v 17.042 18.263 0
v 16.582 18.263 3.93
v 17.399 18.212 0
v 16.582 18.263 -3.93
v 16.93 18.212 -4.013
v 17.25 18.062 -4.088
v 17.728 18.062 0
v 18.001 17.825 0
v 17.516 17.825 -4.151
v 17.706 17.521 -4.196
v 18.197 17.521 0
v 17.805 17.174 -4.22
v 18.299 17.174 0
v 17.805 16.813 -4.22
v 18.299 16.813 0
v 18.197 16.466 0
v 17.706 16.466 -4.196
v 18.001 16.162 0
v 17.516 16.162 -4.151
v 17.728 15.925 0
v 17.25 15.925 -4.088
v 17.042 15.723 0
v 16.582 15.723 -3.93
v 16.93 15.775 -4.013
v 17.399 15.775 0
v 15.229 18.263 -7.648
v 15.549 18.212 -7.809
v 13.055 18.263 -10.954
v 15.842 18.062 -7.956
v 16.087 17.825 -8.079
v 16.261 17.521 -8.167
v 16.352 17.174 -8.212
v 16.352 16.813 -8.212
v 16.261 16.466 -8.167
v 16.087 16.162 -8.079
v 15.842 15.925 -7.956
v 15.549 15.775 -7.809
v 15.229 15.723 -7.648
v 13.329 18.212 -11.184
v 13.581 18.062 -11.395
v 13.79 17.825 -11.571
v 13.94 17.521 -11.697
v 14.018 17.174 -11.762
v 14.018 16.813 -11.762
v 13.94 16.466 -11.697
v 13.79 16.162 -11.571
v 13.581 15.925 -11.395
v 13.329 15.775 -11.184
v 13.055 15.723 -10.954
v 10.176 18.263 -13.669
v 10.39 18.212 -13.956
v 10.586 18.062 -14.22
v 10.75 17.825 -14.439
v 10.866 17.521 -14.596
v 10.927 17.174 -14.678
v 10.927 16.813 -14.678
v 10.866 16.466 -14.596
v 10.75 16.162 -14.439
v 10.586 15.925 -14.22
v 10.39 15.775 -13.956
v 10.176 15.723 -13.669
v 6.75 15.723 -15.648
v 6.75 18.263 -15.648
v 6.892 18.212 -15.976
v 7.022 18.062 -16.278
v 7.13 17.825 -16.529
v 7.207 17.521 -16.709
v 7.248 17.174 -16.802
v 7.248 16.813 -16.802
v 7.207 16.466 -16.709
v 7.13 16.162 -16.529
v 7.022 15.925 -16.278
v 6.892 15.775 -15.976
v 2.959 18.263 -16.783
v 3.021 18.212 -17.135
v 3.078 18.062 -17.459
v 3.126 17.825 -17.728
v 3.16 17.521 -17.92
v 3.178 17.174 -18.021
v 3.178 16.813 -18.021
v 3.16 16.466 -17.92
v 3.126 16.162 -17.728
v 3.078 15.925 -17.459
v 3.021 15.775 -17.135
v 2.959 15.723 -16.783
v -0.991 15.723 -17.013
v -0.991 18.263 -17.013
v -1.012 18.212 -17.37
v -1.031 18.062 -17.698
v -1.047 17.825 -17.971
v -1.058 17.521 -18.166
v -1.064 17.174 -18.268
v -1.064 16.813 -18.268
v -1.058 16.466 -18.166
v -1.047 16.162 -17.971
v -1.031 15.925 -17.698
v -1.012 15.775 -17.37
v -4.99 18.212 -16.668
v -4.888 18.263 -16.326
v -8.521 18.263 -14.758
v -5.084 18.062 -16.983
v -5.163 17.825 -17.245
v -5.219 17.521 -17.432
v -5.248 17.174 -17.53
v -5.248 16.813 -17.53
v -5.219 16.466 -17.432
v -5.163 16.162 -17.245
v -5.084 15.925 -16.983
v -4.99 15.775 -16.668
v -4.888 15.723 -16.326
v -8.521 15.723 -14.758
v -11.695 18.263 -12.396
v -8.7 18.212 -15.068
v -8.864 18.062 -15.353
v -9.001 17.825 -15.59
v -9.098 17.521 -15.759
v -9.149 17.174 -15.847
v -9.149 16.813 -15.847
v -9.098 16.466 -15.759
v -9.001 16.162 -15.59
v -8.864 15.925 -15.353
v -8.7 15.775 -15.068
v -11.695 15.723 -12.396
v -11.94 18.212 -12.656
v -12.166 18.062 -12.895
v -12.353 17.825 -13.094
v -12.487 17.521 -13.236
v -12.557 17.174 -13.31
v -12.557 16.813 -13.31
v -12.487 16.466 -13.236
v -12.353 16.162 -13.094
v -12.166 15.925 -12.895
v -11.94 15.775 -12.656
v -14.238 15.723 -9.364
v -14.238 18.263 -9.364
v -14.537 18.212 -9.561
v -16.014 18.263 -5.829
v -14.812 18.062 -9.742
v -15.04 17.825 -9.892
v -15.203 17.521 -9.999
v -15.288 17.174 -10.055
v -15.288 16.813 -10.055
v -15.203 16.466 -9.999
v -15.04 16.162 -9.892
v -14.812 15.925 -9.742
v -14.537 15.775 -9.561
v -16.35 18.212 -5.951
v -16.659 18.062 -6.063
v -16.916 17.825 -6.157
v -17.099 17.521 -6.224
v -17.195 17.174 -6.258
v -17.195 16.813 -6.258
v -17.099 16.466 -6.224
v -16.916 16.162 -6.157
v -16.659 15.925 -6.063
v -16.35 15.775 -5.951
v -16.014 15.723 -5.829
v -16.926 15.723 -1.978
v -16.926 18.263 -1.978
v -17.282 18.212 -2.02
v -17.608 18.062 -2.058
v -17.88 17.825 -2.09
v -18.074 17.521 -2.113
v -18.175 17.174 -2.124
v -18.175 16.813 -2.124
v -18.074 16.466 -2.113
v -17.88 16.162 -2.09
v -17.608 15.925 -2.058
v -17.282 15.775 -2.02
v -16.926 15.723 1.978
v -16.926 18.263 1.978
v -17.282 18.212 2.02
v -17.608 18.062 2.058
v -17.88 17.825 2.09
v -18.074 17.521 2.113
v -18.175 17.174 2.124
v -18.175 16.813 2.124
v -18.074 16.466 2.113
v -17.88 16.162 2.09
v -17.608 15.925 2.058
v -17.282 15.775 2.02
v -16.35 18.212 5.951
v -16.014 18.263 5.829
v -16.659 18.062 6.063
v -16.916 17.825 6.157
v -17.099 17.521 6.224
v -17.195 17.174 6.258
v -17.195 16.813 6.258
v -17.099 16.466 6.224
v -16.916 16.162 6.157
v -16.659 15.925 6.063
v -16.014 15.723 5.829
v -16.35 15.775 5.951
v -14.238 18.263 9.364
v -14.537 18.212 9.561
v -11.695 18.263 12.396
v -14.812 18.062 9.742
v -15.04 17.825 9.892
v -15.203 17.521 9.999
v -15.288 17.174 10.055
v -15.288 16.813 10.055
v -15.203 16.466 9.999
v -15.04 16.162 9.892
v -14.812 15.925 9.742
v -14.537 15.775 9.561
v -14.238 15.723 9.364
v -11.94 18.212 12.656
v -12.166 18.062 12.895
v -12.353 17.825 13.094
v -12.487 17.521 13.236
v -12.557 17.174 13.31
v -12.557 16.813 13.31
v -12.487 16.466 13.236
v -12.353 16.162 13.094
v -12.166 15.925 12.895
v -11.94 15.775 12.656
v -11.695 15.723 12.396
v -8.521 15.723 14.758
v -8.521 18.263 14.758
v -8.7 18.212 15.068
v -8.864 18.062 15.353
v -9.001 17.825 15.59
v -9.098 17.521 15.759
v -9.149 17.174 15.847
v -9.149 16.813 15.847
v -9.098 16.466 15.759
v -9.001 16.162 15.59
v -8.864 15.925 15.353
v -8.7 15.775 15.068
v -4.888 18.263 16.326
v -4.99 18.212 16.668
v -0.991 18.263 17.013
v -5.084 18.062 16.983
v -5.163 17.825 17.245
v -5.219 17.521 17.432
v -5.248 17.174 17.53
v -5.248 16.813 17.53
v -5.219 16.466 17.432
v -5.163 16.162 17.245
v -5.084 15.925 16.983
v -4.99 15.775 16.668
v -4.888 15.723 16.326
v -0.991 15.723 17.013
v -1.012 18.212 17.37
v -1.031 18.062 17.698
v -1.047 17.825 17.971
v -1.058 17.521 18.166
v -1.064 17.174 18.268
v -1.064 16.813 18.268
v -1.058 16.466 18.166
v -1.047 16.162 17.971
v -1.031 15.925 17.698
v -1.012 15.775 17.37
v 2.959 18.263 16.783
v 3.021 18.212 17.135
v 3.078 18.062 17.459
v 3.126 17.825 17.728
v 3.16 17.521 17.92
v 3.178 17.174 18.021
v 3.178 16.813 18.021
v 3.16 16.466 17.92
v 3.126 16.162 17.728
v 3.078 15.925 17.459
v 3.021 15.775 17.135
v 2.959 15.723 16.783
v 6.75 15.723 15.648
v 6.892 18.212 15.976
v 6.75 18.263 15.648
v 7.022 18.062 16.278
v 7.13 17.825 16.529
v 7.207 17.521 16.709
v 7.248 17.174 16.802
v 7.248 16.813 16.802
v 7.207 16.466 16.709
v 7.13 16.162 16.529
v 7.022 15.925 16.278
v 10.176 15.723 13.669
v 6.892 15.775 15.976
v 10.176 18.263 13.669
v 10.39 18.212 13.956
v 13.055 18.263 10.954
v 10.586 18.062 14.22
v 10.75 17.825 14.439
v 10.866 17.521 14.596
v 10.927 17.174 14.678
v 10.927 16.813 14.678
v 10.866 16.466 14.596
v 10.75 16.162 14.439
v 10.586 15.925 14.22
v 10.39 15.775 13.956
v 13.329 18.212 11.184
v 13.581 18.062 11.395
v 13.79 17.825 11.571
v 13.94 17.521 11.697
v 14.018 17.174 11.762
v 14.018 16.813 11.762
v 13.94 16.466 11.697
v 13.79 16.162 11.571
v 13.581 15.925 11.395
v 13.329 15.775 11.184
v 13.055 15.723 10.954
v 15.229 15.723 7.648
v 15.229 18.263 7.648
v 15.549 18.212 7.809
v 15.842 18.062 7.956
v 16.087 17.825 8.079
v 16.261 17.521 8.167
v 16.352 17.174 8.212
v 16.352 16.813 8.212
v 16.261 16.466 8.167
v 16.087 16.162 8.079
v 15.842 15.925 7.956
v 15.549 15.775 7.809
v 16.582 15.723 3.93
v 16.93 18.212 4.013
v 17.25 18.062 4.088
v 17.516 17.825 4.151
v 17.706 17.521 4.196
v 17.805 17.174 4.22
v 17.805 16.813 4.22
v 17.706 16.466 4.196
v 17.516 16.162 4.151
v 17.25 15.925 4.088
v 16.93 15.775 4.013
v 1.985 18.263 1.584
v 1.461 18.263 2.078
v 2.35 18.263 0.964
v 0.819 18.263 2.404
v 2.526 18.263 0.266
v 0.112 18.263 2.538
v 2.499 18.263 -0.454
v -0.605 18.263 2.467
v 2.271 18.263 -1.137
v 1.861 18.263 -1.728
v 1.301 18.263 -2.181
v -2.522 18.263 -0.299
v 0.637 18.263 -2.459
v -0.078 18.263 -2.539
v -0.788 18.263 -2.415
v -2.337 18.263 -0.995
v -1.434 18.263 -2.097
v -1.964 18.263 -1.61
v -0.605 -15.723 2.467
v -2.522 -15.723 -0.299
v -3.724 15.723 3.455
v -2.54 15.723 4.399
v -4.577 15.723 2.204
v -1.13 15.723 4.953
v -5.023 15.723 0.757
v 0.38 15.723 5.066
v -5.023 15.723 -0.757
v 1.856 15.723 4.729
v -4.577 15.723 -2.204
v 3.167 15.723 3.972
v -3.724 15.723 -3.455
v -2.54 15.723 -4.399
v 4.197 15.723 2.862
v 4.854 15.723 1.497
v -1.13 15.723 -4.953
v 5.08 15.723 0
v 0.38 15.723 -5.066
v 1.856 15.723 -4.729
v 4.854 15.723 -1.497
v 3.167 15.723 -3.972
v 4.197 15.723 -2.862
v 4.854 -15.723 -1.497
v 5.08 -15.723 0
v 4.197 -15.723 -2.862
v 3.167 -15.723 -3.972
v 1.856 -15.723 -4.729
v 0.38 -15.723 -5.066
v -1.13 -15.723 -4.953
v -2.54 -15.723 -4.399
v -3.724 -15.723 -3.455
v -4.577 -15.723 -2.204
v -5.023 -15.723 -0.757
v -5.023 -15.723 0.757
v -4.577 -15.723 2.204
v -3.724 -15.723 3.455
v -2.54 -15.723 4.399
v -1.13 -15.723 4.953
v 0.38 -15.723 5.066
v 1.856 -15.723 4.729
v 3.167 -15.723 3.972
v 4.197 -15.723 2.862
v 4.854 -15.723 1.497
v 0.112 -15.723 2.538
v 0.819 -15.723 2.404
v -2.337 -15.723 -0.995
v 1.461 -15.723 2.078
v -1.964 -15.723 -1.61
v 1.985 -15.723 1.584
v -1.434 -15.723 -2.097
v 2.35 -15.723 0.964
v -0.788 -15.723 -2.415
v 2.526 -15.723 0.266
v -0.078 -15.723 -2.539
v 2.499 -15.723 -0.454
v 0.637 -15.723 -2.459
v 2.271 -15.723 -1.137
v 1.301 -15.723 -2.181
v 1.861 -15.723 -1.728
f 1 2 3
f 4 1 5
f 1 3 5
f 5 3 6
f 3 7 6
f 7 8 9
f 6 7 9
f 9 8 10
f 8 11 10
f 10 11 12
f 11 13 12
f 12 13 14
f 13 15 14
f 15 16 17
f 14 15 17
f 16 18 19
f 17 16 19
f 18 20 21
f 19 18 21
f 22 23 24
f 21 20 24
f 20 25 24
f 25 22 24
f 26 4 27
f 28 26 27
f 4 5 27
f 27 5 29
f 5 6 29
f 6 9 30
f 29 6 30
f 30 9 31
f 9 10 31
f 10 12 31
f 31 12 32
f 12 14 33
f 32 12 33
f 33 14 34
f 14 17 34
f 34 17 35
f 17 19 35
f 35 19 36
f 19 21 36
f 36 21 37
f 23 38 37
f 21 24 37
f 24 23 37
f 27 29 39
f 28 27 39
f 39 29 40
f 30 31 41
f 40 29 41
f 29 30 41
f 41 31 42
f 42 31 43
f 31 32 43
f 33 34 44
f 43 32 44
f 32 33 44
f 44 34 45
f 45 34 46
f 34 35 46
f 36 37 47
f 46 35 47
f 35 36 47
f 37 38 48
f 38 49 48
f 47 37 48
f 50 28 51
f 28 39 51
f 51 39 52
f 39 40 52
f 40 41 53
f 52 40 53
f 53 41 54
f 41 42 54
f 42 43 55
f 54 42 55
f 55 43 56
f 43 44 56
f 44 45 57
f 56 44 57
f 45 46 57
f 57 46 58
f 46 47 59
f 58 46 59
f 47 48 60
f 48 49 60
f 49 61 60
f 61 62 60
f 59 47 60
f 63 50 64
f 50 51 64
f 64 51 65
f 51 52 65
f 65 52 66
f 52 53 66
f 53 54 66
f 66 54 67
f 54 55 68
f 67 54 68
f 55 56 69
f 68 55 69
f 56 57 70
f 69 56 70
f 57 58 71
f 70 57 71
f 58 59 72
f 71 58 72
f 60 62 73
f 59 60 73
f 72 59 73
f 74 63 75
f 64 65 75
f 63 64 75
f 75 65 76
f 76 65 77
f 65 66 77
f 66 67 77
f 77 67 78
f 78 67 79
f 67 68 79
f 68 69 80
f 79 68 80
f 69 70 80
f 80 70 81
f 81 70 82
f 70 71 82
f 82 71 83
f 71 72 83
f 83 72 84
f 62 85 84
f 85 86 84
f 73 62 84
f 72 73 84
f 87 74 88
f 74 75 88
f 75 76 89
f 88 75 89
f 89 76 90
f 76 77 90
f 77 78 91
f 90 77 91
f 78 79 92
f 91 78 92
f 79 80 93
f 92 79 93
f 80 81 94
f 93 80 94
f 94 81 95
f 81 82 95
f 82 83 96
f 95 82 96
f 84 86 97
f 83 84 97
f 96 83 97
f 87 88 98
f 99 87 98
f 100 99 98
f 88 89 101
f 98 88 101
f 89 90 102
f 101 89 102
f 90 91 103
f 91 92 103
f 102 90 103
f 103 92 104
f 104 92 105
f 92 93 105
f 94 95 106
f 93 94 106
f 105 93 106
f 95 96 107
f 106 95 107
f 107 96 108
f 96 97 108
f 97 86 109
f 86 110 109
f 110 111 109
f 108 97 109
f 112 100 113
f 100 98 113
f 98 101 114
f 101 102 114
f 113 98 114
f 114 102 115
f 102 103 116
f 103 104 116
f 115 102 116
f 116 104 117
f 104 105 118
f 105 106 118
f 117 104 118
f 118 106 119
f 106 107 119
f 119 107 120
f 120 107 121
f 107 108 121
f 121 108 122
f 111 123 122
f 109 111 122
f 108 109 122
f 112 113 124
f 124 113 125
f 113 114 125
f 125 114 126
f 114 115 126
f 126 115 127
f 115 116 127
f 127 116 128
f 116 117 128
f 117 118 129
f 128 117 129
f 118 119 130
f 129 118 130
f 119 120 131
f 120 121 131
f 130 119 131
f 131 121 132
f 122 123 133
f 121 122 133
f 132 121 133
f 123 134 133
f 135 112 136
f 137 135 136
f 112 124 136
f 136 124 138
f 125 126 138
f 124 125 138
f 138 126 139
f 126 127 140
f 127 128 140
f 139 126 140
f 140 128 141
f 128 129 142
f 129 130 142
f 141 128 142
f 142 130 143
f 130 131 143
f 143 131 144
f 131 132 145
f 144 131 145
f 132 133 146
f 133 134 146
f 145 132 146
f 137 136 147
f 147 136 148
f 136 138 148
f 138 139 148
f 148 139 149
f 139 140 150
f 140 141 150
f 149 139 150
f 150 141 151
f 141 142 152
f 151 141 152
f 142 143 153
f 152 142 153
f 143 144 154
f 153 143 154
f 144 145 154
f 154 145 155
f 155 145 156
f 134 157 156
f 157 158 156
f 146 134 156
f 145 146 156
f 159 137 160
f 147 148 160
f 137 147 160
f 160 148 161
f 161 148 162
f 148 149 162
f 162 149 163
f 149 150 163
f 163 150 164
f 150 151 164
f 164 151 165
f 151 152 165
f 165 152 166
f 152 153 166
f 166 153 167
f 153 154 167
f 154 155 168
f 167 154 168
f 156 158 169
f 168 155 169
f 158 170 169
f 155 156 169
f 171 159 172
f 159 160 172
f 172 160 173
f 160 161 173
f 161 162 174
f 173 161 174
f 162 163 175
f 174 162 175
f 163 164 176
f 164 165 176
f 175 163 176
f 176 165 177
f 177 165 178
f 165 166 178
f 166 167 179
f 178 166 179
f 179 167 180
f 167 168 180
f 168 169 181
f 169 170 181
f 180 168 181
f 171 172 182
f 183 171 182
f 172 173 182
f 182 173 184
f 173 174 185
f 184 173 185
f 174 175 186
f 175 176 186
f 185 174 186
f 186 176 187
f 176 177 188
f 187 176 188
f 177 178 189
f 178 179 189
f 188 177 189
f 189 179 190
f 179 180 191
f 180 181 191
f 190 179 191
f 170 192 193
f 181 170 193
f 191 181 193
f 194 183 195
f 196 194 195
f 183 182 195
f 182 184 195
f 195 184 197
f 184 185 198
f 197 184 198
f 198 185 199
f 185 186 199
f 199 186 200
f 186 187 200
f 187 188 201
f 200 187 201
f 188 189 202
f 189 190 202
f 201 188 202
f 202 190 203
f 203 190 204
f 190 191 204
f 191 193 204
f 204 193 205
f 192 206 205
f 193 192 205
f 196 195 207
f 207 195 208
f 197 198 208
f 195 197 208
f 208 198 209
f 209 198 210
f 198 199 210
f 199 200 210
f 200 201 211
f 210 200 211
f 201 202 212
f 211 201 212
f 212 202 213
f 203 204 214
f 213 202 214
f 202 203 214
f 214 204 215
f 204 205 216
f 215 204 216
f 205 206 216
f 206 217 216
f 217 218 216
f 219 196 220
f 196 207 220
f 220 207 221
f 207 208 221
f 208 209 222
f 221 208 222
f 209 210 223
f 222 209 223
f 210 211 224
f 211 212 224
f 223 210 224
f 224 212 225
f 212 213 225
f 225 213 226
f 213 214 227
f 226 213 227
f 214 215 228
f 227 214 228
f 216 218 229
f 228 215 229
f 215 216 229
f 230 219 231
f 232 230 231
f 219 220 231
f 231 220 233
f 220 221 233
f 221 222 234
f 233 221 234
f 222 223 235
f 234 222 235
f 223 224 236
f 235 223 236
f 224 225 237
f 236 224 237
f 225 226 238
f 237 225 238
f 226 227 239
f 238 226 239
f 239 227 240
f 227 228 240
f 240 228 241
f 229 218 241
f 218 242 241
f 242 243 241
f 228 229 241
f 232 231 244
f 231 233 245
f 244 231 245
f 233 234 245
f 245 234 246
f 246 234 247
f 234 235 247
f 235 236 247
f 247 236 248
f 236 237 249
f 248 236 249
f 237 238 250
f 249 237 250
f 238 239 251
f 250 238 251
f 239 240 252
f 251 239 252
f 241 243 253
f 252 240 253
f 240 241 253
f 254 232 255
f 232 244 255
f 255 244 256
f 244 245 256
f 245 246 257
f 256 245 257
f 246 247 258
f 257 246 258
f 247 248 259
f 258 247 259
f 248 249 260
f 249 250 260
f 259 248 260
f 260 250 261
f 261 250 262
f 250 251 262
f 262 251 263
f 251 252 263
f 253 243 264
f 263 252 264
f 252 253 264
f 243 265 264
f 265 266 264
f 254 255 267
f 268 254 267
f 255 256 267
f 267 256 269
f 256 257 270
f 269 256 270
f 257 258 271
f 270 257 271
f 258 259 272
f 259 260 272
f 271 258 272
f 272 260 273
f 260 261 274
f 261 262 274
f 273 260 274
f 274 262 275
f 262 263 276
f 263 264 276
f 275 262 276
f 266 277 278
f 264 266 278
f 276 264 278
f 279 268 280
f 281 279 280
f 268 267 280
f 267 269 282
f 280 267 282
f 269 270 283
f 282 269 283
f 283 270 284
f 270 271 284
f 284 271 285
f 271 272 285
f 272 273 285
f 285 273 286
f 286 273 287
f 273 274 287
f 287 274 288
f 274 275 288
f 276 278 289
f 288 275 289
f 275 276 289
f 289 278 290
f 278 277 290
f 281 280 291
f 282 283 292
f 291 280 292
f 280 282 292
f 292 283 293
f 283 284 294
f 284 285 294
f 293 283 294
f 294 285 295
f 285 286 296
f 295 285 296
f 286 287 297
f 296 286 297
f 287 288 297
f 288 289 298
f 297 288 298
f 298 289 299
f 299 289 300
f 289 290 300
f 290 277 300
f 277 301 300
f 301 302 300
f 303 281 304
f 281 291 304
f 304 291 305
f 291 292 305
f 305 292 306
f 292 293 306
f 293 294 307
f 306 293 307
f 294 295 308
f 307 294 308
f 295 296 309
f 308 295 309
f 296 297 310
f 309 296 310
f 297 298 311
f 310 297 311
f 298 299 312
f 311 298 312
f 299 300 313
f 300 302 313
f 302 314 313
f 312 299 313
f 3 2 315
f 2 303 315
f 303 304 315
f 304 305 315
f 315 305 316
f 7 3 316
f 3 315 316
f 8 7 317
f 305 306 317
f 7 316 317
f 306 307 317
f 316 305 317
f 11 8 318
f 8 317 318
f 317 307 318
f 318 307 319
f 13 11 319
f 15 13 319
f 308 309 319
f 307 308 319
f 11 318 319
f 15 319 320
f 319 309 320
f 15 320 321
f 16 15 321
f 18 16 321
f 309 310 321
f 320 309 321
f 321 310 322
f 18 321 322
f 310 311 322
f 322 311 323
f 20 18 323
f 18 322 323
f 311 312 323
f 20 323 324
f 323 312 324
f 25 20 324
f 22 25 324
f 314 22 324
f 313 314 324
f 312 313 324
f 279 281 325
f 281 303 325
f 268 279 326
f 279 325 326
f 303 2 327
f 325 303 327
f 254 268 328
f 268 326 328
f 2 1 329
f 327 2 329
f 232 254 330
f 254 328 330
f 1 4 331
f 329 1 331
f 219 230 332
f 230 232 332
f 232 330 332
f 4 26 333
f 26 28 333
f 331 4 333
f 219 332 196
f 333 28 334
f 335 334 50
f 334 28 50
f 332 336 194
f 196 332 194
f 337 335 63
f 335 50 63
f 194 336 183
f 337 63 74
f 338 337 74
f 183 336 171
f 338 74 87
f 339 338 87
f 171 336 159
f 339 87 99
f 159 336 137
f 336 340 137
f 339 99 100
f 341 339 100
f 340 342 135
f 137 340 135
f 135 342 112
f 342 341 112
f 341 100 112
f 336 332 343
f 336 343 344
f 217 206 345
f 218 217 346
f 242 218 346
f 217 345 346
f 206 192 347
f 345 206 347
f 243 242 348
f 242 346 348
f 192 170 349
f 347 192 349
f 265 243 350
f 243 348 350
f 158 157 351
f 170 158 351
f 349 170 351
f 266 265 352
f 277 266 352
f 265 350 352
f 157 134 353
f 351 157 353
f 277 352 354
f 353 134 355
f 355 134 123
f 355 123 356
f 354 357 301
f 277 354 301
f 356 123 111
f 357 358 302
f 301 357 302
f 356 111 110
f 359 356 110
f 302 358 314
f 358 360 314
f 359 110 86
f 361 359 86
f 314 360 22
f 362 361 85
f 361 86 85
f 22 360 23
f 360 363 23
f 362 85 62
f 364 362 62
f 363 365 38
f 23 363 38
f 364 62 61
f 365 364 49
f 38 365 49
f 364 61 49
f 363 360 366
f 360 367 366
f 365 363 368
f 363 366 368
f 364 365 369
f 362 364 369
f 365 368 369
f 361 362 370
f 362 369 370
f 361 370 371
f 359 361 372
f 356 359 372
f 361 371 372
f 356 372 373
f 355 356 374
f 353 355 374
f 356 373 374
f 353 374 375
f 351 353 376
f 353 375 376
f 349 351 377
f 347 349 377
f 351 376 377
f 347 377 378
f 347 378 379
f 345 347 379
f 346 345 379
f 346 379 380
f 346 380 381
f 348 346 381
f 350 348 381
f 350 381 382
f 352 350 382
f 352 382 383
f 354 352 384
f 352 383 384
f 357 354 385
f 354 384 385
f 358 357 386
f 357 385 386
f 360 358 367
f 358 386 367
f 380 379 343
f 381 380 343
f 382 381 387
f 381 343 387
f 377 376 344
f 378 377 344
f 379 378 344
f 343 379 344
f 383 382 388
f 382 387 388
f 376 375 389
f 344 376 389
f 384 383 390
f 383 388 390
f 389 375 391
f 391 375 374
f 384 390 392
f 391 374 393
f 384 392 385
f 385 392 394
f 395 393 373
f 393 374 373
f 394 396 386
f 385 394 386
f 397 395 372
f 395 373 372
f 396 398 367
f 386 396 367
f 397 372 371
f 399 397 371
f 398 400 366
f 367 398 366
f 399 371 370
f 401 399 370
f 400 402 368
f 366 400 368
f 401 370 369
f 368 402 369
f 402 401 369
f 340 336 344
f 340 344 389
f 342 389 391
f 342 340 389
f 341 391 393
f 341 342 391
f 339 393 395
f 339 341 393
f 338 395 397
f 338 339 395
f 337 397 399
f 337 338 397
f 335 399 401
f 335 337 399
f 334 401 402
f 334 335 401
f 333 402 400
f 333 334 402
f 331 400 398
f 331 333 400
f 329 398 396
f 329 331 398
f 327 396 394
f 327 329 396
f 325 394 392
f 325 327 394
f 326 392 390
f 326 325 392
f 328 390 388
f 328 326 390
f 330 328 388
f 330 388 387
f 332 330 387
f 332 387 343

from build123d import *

# Parameters (mm, degrees)
CUT_EXTRUDE1_DEPTH = 43.728464961


with BuildPart() as part:
    # Sketch1 → Revolve1 (revolve)
    with BuildSketch(Plane.XY):
        with BuildLine():
            Line((0, -15.723376421), (0, 18.263376421))
            Line((0, 18.263376421), (17.041503786, 18.263376421))
            ThreePointArc((17.041503786, 18.263376421), (18.311503786, 16.993376421), (17.041503786, 15.723376421))
            Line((17.041503786, 15.723376421), (5.08, 15.723376421))
            Line((5.08, 15.723376421), (5.08, -15.723376421))
            Line((5.08, -15.723376421), (0, -15.723376421))
        make_face()
    revolve(axis=Axis((0, -15.723376421, 0), (0, 1, 0)))

    # Sketch2 → Cut-Extrude1 (cut, through all)
    with BuildSketch(Plane(origin=(0, 18.263376421, 0), x_dir=(1, 0, 0), z_dir=(0, 1, 0))):
        with BuildLine():
            Line((-0.604738857, -2.466959853), (-2.522366538, 0.298775913))
            ThreePointArc((-2.522366538, 0.298775913), (2.087347748, 1.447266174), (-0.604738857, -2.466959853))
        make_face()
    extrude(amount=-CUT_EXTRUDE1_DEPTH, mode=Mode.SUBTRACT)


solid = part.part
